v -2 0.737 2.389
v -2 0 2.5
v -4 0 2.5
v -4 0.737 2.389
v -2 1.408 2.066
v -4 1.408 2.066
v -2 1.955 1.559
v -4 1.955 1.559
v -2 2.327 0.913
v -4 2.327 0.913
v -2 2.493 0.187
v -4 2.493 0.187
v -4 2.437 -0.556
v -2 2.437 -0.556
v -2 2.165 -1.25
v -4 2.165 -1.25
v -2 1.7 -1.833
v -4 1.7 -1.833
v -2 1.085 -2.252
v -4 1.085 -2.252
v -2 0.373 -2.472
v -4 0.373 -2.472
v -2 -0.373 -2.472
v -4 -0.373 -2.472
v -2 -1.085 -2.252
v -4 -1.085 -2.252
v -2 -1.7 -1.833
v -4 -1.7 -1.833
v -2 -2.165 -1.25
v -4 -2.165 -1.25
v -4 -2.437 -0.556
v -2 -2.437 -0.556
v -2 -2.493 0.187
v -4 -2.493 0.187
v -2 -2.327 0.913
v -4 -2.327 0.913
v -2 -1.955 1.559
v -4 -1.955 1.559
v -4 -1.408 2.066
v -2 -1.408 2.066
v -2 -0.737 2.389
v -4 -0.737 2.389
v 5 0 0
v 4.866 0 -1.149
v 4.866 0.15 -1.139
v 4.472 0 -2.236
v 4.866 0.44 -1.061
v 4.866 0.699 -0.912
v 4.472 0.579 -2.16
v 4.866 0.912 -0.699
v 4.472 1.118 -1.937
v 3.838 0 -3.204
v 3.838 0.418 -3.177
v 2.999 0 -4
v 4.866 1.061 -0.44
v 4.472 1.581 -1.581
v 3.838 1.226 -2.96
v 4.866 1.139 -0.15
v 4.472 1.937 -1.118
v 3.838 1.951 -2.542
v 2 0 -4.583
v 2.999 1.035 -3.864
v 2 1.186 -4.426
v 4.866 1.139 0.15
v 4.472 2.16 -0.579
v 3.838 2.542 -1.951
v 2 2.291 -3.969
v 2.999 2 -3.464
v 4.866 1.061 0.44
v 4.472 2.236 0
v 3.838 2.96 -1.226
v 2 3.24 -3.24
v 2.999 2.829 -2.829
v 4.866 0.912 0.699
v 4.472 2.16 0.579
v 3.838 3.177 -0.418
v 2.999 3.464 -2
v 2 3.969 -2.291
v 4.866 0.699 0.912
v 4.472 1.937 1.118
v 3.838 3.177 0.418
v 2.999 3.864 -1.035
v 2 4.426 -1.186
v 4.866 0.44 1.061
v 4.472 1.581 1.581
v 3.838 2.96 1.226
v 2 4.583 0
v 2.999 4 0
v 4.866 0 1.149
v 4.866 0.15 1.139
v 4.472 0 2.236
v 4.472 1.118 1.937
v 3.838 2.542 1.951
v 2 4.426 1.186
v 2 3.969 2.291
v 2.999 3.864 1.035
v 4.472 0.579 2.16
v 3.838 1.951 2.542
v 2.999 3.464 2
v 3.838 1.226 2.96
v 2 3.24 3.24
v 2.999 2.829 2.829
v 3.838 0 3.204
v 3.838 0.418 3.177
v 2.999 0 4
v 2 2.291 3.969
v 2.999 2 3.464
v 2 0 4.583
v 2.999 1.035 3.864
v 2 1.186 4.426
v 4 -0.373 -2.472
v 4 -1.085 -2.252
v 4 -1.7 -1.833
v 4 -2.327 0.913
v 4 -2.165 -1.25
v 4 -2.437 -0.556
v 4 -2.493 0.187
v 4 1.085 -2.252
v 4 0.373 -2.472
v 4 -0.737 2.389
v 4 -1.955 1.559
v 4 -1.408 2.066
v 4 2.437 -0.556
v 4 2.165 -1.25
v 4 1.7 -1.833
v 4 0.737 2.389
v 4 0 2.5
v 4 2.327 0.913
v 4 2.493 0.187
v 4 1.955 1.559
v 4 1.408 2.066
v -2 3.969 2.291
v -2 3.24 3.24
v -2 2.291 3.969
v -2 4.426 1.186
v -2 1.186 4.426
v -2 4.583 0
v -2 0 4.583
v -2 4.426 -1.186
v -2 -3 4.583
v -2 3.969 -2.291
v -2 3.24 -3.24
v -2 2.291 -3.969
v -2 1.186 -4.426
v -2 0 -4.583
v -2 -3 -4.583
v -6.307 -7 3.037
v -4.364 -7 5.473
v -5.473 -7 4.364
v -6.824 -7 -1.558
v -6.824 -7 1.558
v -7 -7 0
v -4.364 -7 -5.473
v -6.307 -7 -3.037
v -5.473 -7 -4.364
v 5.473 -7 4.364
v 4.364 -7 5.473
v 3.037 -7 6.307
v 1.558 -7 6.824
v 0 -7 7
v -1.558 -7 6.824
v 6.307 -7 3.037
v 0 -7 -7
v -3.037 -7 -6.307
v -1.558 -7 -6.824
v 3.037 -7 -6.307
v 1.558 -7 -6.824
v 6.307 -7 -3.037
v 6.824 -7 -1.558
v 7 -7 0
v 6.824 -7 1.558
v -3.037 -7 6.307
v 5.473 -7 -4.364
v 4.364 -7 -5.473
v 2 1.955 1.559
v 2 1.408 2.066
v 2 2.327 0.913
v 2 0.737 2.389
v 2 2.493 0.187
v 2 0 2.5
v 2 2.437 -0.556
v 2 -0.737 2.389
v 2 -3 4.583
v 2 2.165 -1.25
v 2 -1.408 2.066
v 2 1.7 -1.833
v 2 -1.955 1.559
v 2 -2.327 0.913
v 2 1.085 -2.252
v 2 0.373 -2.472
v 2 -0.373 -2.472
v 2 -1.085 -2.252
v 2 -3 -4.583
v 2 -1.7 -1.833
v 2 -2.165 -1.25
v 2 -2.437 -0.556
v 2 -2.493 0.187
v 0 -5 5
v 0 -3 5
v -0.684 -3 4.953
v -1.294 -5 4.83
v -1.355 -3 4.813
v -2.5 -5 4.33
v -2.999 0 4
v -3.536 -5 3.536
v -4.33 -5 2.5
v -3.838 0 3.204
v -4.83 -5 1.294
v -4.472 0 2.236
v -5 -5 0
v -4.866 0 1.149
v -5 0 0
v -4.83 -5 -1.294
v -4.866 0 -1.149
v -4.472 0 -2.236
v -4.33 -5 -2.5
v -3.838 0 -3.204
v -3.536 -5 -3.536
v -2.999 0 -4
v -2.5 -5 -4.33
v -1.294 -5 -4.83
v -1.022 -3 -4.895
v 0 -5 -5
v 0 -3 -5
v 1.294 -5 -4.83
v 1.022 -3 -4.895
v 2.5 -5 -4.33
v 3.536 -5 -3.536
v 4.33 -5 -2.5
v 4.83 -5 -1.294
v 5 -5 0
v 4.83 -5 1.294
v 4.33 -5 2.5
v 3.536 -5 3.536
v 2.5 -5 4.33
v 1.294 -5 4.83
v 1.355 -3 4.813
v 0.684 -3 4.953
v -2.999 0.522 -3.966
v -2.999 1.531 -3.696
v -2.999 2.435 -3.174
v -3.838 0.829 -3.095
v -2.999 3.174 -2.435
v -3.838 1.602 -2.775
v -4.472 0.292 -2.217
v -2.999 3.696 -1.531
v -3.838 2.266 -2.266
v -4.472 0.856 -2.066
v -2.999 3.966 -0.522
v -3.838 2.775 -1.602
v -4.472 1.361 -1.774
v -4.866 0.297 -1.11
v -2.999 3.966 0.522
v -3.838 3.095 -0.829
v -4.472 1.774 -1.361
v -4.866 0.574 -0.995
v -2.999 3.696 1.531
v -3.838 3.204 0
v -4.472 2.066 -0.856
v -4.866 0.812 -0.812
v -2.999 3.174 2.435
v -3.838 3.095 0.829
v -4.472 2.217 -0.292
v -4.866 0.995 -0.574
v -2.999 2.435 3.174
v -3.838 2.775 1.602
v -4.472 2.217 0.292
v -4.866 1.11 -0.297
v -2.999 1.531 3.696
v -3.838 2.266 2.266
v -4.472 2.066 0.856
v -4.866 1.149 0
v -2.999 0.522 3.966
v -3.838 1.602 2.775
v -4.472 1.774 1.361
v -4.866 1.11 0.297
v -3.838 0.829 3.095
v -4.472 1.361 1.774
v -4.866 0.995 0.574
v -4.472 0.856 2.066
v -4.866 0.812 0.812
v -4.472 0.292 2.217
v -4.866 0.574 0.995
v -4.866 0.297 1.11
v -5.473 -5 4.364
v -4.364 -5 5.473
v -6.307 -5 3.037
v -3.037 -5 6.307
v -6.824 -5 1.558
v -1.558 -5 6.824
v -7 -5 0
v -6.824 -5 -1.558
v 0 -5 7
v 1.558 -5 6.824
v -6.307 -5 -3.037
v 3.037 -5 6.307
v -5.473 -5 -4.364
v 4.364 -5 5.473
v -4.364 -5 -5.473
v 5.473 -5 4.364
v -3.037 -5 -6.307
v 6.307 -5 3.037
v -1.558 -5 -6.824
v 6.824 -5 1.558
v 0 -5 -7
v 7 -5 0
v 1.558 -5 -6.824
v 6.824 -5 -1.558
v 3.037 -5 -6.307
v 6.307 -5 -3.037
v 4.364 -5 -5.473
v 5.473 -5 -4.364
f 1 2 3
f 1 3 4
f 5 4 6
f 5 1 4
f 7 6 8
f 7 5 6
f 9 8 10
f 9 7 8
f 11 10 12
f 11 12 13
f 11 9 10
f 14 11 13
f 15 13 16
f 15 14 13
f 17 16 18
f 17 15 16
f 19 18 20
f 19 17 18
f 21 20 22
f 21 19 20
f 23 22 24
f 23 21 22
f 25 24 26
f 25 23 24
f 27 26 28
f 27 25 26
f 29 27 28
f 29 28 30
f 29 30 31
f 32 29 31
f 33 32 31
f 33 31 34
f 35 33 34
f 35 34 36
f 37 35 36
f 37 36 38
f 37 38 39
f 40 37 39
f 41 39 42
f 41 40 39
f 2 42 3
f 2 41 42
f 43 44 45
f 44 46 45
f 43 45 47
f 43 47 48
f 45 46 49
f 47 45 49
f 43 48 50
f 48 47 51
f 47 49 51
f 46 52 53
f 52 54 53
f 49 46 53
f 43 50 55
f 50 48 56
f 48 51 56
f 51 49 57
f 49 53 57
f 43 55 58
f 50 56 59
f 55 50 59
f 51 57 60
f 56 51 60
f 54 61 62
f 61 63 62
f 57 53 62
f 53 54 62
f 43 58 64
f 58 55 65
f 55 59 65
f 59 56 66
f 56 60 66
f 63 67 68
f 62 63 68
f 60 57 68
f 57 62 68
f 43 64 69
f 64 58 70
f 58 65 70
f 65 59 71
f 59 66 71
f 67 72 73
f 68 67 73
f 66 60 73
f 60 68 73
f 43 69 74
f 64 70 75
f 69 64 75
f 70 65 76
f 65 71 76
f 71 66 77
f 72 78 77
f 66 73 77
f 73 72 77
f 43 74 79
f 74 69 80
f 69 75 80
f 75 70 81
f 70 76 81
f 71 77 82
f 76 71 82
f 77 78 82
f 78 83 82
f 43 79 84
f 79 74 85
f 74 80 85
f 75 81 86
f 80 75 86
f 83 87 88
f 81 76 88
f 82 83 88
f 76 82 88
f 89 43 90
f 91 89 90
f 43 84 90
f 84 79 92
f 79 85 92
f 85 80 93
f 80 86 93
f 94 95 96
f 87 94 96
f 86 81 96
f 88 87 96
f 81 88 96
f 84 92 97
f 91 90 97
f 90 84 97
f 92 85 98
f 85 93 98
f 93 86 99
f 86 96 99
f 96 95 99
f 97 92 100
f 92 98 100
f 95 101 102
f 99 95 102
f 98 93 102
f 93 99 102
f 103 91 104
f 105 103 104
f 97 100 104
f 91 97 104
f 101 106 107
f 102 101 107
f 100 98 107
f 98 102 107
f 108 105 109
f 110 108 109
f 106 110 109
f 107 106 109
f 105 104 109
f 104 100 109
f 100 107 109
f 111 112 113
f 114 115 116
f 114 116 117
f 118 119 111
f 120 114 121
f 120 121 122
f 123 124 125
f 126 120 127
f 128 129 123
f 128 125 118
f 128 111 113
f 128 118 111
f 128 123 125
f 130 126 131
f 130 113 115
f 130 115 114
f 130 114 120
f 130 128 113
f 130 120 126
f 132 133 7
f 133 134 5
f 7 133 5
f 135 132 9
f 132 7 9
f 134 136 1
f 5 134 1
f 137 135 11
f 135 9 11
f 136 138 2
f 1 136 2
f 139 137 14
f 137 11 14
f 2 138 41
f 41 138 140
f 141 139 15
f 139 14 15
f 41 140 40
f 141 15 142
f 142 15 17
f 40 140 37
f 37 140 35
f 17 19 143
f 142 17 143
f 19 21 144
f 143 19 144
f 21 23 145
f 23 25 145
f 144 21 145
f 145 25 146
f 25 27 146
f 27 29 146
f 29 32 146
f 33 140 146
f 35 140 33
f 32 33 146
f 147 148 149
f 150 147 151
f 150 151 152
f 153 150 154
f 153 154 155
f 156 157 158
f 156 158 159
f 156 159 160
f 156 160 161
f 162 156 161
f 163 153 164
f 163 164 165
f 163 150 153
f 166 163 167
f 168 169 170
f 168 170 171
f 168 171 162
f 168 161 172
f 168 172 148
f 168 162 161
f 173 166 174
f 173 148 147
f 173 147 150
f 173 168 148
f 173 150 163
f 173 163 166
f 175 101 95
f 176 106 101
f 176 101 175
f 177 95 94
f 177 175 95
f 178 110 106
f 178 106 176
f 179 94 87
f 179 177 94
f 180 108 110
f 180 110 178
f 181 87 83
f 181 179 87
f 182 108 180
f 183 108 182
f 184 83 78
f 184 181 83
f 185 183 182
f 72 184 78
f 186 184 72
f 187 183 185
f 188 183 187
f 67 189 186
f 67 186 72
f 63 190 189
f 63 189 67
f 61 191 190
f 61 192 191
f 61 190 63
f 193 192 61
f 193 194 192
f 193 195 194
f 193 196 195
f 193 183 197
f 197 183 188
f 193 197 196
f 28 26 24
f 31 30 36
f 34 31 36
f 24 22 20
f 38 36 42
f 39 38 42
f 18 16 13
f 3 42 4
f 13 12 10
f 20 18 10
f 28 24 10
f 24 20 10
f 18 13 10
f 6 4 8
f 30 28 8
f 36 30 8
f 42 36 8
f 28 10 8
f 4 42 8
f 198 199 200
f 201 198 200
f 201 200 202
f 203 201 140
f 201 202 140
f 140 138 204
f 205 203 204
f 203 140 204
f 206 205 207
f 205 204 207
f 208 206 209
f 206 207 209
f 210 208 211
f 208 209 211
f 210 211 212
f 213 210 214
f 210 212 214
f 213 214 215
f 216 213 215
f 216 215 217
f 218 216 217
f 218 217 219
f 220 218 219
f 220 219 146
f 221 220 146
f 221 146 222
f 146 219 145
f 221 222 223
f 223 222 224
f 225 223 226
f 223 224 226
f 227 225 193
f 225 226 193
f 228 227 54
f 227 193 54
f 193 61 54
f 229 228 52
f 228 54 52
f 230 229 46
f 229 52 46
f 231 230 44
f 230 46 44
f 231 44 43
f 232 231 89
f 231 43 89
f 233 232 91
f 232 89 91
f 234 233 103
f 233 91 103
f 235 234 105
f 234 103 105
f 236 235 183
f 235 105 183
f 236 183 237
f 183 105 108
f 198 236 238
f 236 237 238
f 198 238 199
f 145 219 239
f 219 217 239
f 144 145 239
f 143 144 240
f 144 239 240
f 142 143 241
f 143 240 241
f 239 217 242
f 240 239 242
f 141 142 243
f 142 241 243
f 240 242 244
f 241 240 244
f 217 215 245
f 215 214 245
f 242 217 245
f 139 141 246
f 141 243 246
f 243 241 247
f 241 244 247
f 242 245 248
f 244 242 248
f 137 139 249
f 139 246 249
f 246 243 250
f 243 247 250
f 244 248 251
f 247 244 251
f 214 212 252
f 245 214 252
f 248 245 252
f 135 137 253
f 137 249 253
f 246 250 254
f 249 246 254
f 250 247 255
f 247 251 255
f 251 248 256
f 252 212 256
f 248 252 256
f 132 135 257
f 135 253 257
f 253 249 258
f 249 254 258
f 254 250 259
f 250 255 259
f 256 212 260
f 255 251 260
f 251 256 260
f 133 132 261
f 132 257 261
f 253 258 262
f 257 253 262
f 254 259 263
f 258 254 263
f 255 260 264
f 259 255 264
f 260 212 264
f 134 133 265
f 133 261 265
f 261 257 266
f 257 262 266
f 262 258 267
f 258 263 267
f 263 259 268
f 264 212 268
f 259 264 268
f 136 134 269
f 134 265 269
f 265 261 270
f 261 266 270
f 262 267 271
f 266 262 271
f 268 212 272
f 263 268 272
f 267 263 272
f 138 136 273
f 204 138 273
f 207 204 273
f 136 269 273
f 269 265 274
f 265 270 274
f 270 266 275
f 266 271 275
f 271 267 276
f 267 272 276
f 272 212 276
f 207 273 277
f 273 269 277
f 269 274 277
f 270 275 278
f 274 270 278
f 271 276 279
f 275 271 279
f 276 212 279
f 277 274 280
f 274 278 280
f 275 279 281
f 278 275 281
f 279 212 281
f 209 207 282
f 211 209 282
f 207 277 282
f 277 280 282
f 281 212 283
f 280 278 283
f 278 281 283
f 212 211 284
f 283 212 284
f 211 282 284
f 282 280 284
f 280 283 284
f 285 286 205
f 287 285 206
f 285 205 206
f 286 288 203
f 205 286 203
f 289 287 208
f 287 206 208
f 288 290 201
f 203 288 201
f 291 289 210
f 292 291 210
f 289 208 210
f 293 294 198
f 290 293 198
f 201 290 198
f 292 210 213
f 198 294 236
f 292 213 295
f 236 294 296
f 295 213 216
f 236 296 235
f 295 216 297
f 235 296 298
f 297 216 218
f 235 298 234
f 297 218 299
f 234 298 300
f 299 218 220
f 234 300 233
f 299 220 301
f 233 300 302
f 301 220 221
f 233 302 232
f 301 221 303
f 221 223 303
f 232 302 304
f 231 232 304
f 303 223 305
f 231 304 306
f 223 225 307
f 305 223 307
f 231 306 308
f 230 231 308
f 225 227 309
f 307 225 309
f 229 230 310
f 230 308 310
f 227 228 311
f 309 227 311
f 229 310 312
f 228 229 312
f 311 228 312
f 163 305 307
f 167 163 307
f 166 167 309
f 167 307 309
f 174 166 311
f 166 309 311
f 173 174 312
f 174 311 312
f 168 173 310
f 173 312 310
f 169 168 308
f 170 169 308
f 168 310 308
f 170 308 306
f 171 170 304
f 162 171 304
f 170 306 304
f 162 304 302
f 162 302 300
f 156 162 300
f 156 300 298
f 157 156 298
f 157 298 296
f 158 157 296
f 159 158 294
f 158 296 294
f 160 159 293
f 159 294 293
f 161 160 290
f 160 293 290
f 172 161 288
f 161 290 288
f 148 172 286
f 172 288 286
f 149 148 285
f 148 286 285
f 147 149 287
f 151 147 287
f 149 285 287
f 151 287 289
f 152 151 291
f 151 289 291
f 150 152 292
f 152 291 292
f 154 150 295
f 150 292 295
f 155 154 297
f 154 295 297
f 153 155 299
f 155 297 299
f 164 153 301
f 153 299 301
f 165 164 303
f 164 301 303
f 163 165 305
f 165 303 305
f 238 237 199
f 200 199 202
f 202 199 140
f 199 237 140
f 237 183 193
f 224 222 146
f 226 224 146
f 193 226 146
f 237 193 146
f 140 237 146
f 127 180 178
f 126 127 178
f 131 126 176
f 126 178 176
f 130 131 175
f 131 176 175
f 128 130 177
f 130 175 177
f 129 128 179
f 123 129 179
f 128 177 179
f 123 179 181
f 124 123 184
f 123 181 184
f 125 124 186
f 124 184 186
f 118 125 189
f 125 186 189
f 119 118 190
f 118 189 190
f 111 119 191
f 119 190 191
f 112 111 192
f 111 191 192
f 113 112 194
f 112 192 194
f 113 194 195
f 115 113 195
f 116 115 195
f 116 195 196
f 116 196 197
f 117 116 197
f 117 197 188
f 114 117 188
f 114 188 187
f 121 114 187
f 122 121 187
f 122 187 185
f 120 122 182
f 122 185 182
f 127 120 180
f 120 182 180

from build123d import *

# Parameters (mm, degrees)
REVOLVE1_ANGLE      = 180
SKETCH2_R           = 5
BOSS_EXTRUDE1_DEPTH = 5
SKETCH3_R           = 7
BOSS_EXTRUDE2_DEPTH = 2
CUT_EXTRUDE1_START  = -3
SKETCH4_W           = 2
SKETCH4_H           = 10
CUT_EXTRUDE1_DEPTH  = 16.124355653
SKETCH6_R           = 2.5
CUT_EXTRUDE2_DEPTH  = 2


with BuildPart() as part:
    # Sketch1 → Revolve1 (revolve)
    with BuildSketch(Plane(origin=(0, 0, 0), x_dir=(1, 0, 0), z_dir=(0, 1, 0))):
        with BuildLine():
            Line((-5, 0), (5, 0))
            ThreePointArc((5, 0), (0, 5), (-5, 0))
        make_face()
    revolve(axis=Axis((-5, 0, 0), (1, 0, 0)), revolution_arc=REVOLVE1_ANGLE)

    # Sketch2 → Boss-Extrude1 (add)
    with BuildSketch(Plane.XZ):
        with Locations(Location((0, 0, 0), (0, 0, 90))):
            Circle(SKETCH2_R)
    extrude(amount=BOSS_EXTRUDE1_DEPTH)

    # Sketch3 → Boss-Extrude2 (add)
    with BuildSketch(Plane.XZ.offset(5)):
        with Locations(Location((0, 0, 0), (0, 0, 270))):
            Circle(SKETCH3_R)
    extrude(amount=BOSS_EXTRUDE2_DEPTH)

    # Sketch4 → Cut-Extrude1 (cut)
    with BuildSketch(Plane(origin=(0, 0, 0), x_dir=(1, 0, 0), z_dir=(0, 1, 0)).offset(CUT_EXTRUDE1_START)):
        with Locations((1, 0)):
            Rectangle(SKETCH4_W, SKETCH4_H)
    cut_extrude1 = extrude(amount=CUT_EXTRUDE1_DEPTH, mode=Mode.SUBTRACT)

    # Sketch6 → Cut-Extrude2 (cut)
    with BuildSketch(Plane.ZY.offset(-2)):
        Circle(SKETCH6_R)
    cut_extrude2 = extrude(amount=-CUT_EXTRUDE2_DEPTH, mode=Mode.SUBTRACT)

    # Mirror1: Cut-Extrude1, Cut-Extrude2 across plane
    add(cut_extrude1.mirror(Plane(origin=(0, 0, 0), x_dir=(0, 0, 1), z_dir=(1, 0, 0))), mode=Mode.SUBTRACT)
    add(cut_extrude2.mirror(Plane(origin=(0, 0, 0), x_dir=(0, 0, 1), z_dir=(1, 0, 0))), mode=Mode.SUBTRACT)


solid = part.part
